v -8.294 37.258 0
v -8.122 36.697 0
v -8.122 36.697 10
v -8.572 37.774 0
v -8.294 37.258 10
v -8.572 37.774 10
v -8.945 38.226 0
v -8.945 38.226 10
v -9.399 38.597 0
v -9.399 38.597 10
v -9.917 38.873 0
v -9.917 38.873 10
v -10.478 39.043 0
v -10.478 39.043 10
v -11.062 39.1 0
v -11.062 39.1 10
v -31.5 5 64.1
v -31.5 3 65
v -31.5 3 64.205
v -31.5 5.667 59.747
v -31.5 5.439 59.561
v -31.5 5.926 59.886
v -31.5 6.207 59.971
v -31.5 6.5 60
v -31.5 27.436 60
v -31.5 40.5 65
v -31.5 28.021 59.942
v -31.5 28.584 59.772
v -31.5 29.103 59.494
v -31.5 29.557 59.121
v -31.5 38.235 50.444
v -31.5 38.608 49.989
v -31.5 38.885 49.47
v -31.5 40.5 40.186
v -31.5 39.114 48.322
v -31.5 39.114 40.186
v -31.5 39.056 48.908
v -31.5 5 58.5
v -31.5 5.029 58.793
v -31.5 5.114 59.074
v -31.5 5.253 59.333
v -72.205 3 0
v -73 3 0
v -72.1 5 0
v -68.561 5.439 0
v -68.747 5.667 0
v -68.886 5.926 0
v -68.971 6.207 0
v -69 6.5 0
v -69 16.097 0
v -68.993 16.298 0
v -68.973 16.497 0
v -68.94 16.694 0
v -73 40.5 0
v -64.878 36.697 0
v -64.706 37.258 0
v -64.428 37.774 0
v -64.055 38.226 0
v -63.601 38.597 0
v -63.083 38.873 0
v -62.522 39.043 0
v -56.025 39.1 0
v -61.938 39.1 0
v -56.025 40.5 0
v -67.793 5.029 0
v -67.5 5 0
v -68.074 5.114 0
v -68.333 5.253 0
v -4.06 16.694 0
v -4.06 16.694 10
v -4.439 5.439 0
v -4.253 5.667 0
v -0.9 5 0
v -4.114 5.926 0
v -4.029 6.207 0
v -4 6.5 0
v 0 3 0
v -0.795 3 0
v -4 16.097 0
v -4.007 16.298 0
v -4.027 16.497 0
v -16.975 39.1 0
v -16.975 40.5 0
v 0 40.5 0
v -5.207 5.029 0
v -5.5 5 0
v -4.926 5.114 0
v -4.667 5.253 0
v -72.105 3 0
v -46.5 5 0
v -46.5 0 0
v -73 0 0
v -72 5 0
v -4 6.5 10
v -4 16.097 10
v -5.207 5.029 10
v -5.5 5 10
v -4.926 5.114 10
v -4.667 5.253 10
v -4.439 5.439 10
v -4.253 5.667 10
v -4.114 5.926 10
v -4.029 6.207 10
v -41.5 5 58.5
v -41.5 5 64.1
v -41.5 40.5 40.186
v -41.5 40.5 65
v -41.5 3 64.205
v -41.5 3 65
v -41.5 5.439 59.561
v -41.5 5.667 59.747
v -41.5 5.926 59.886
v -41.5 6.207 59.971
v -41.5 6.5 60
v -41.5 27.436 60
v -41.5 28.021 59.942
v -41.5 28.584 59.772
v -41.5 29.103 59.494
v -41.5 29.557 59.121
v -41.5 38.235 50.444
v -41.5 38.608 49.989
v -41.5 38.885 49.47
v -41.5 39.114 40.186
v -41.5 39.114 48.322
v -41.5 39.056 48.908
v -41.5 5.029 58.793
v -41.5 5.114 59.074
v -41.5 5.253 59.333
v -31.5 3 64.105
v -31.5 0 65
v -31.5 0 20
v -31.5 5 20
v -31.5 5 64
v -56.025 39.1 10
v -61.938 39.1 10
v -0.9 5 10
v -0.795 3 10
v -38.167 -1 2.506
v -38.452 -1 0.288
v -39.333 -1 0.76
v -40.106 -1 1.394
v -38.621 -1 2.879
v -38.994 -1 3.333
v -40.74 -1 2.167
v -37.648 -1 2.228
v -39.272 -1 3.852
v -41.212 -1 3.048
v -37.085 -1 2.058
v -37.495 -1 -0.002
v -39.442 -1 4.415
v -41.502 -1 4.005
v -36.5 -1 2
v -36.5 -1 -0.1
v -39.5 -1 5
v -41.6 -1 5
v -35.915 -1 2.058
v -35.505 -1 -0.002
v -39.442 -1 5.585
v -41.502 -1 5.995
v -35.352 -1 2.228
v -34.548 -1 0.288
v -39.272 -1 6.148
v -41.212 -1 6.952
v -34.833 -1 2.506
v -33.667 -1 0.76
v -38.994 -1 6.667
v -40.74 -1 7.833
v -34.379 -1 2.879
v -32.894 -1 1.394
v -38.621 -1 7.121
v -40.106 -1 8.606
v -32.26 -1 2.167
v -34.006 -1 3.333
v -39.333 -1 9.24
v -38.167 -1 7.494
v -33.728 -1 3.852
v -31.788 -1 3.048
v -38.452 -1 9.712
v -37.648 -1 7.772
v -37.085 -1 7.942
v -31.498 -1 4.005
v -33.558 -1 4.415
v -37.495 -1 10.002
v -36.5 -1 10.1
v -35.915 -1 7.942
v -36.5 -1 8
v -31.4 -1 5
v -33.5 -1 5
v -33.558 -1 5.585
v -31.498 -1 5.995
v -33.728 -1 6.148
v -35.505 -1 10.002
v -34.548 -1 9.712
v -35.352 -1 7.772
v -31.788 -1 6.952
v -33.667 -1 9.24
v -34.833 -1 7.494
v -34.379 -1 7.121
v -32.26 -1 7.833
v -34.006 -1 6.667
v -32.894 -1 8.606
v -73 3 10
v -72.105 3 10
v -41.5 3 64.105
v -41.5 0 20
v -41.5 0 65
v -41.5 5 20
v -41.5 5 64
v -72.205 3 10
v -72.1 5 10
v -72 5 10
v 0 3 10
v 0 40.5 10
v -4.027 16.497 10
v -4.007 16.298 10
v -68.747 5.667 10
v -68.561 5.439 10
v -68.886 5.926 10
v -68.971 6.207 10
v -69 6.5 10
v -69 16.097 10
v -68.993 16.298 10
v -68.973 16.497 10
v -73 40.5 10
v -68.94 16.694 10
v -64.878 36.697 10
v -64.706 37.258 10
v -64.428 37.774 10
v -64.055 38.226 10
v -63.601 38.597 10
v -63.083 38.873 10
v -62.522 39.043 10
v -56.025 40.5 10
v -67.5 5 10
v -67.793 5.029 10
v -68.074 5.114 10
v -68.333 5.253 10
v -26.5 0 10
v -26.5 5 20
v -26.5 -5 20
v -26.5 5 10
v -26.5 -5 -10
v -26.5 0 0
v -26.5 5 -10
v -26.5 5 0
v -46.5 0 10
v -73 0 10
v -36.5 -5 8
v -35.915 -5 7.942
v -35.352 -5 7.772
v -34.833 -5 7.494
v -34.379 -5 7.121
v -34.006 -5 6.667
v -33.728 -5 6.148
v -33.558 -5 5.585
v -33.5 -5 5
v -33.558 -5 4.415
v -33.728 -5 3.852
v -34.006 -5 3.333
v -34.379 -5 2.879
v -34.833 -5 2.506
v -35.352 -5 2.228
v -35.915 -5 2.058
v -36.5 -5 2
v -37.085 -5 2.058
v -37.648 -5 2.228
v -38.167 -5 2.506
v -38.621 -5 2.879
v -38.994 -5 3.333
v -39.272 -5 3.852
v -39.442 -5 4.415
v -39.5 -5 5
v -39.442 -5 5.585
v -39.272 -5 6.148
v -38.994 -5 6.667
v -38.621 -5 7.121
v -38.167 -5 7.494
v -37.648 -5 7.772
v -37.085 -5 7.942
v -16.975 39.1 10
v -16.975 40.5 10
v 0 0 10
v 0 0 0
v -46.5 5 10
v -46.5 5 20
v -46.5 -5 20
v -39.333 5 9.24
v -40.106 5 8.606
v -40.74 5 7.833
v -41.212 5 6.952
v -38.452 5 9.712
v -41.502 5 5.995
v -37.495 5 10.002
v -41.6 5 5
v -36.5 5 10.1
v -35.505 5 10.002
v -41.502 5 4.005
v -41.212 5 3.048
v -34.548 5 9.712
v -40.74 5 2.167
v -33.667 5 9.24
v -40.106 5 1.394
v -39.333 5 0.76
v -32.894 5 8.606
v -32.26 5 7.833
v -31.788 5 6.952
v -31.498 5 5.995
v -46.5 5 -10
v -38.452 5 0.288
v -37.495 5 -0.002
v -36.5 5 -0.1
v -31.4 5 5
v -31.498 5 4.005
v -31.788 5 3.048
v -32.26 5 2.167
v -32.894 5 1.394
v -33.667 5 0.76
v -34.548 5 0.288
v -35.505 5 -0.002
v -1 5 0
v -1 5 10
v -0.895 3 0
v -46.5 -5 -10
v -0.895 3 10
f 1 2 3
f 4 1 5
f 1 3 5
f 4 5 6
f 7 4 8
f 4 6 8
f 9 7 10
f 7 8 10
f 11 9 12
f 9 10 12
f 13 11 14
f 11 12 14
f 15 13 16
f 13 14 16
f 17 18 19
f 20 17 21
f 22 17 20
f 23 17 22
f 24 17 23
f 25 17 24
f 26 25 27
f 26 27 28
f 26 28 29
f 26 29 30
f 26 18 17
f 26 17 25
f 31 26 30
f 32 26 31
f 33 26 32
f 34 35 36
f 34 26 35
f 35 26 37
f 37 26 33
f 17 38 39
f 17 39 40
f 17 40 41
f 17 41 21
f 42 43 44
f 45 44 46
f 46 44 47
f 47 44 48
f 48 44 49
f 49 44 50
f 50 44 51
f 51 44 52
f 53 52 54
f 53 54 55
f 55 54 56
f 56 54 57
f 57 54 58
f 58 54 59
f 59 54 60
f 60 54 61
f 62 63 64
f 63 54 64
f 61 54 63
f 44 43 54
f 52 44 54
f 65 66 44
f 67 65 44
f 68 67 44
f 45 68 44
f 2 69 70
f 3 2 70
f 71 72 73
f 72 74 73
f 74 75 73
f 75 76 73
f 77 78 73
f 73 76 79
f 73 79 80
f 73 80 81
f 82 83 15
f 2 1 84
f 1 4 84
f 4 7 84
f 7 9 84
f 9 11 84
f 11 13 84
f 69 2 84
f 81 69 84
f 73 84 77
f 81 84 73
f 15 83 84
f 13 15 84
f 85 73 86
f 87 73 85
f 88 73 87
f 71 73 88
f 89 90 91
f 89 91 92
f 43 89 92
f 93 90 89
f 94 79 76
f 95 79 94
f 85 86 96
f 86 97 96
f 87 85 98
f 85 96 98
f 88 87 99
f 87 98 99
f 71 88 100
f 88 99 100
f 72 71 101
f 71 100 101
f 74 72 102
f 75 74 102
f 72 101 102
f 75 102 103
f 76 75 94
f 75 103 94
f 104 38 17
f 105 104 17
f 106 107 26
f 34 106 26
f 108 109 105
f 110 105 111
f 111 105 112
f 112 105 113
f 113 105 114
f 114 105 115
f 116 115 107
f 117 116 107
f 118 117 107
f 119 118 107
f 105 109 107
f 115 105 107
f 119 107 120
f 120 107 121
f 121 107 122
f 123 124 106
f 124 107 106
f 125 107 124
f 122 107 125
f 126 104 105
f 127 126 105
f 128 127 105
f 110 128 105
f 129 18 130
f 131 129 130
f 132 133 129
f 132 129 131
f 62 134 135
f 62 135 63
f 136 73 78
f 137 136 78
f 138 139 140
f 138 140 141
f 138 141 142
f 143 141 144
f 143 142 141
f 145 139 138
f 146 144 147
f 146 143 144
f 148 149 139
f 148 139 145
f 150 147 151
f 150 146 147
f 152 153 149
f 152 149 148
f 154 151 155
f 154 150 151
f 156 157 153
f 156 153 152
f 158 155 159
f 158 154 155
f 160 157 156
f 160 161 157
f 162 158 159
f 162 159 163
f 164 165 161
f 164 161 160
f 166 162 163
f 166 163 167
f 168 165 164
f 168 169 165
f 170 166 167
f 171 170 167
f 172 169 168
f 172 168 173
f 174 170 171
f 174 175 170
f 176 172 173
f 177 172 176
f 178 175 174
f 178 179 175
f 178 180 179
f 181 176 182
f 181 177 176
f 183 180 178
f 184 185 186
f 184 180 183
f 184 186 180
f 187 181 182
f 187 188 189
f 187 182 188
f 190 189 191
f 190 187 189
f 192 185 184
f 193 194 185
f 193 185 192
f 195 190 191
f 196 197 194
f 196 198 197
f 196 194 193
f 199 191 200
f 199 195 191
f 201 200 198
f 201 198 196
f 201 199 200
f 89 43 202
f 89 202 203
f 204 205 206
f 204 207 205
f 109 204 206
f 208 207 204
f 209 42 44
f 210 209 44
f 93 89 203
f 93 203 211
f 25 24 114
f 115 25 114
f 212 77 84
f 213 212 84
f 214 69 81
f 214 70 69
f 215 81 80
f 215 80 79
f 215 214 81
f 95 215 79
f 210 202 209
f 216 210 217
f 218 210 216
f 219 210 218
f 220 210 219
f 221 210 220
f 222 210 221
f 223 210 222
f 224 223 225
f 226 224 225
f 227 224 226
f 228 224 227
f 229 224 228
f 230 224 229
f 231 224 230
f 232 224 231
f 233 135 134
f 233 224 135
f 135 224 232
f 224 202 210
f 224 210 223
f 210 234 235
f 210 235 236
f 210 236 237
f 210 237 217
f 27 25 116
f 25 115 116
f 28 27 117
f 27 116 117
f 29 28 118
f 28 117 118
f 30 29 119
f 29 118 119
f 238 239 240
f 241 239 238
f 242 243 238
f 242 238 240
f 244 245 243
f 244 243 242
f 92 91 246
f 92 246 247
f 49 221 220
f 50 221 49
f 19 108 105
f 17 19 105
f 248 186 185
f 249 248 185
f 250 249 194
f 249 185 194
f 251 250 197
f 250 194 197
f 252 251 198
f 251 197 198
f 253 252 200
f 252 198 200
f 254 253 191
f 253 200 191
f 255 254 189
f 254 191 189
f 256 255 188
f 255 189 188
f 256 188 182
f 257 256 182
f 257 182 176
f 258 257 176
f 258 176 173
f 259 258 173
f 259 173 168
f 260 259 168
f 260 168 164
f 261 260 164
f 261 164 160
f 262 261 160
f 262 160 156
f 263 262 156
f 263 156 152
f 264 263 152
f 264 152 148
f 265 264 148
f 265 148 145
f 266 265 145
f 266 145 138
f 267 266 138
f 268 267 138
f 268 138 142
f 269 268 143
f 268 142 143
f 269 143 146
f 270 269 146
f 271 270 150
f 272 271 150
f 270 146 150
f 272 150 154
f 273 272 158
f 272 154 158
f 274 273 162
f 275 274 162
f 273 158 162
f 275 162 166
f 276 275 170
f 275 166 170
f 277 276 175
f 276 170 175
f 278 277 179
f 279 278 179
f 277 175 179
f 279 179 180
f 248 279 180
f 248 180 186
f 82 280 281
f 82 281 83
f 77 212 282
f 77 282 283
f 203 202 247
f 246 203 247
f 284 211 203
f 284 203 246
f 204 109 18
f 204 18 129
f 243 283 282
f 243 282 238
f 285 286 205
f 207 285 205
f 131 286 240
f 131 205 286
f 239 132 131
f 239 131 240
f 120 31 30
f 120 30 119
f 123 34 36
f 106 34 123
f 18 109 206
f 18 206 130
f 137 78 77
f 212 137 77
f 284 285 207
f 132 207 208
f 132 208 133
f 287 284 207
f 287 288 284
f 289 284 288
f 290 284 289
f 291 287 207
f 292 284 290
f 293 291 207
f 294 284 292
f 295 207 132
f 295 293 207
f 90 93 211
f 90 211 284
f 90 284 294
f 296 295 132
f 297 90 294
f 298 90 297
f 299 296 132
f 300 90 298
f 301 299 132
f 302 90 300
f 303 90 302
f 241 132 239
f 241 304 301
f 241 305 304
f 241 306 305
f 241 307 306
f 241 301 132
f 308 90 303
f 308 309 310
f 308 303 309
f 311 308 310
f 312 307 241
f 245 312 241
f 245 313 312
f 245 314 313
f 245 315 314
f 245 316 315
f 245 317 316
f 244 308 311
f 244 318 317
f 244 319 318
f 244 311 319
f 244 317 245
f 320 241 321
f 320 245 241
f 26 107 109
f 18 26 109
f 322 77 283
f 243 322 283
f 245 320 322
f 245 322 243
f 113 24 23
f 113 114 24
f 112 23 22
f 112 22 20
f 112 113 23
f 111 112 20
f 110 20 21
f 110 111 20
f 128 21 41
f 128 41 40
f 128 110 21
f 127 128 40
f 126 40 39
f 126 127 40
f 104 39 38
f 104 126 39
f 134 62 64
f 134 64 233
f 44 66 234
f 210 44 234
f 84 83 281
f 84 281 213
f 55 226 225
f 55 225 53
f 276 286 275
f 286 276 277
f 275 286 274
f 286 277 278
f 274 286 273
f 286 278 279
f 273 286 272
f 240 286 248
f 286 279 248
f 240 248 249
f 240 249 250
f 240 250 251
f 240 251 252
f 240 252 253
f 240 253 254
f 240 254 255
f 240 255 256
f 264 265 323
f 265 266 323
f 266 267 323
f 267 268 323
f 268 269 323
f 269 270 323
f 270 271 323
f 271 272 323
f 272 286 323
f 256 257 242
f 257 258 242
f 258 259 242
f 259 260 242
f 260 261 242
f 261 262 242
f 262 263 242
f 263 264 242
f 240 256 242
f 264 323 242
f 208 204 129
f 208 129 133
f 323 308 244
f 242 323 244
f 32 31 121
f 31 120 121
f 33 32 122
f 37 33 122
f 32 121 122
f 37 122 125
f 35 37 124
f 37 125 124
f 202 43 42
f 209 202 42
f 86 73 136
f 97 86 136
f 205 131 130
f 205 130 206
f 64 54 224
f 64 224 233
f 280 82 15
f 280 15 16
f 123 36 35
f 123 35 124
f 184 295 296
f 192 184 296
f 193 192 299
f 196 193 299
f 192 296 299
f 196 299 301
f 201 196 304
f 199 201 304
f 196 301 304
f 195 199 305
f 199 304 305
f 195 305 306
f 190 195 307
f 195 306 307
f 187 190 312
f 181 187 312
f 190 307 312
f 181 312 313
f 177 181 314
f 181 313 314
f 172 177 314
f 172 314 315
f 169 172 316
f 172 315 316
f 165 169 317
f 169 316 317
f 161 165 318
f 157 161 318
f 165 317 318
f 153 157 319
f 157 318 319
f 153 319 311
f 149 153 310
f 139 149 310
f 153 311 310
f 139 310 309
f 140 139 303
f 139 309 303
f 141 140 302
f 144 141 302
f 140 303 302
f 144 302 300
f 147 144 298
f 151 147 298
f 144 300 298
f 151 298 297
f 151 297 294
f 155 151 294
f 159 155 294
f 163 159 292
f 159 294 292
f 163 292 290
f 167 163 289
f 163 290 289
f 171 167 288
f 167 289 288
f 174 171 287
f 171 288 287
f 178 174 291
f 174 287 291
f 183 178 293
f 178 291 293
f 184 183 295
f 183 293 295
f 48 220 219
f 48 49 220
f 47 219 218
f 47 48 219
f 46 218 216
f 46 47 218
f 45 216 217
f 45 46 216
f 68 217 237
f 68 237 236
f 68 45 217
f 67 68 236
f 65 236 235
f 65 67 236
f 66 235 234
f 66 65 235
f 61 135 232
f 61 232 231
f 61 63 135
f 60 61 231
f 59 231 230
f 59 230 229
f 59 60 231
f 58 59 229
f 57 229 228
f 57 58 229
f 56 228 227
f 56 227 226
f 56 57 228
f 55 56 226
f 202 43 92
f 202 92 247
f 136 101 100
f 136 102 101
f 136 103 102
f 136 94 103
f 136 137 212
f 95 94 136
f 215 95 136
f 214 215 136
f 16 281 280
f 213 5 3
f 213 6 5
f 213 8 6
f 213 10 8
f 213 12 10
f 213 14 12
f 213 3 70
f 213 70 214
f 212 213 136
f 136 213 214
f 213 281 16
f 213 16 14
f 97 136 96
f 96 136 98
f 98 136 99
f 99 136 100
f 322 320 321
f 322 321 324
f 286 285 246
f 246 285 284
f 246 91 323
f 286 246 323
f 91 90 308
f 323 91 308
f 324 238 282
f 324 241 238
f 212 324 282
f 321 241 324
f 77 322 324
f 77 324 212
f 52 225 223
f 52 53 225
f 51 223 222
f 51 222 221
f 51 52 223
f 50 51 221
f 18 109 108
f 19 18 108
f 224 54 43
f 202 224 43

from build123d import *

# Parameters (mm, degrees)
BOSS_EXTRUDE1_DEPTH      = 5
SKETCH2_W                = 10
SKETCH2_H                = 5
SKETCH5_W                = 4
SKETCH5_H                = 10
SKETCH15_W               = 4
SKETCH15_H               = 10
FILLET1_R                = 3
FILLET2_R                = 3
FILLET3_R                = 1.5
FILLET4_R                = 3
FILLET5_R                = 1.5
LIP_GROOVE1_GROOVE_START = -41.5
LIP_GROOVE1_GROOVE_DEPTH = 10
LIP_GROOVE1_LIP_START    = -41.5
LIP_GROOVE1_LIP_DEPTH    = 10
LIP_GROOVE2_GROOVE_DEPTH = 10
LIP_GROOVE2_LIP_DEPTH    = 10
LIP_GROOVE3_GROOVE_DEPTH = 10
LIP_GROOVE3_LIP_DEPTH    = 10
BOSS_EXTRUDE2_DEPTH      = 10
BOSS_EXTRUDE3_DEPTH      = 10
CUT_EXTRUDE1_START       = -10
CUT_EXTRUDE1_OUTLINE_W   = 16.974937186
CUT_EXTRUDE1_OUTLINE_H   = 2.6
CUT_EXTRUDE1_OUTLINE_W_2 = 10
CUT_EXTRUDE1_OUTLINE_H_2 = 3.613708499
CUT_EXTRUDE1_DEPTH       = 65
SKETCH25_W               = 20
SKETCH25_H               = 30
BOSS_EXTRUDE4_DEPTH      = 10
SKETCH40_R               = 5.1
CUT_EXTRUDE4_DEPTH       = 6
SKETCH43_R               = 3
CUT_EXTRUDE5_DEPTH       = 104.991586198


# Read off the part's stored shape, not the designer's step: Lip&Groove1-Groove, Lip&Groove1-Lip, Lip&Groove2-Groove, Lip&Groove2-Lip, Lip&Groove3-Groove, Lip&Groove3-Lip, Cut-Extrude1
with BuildPart() as part:
    # Sketch1 → Boss-Extrude1 (new body)
    with BuildSketch(Plane(origin=(0, 0, 0), x_dir=(1, 0, 0), z_dir=(0, 1, 0))):
        Polygon((-41.5, -10), (-73, -10), (-73, 0), (0, 0), (0, -10), (-31.5, -10), (-31.5, -65), (-41.5, -65), align=None)
    extrude(amount=BOSS_EXTRUDE1_DEPTH)

    # Sweep1: sweep along a path in Sketch4
    with BuildLine(Plane.ZY.offset(36.5)) as sweep1_path:
        Line((61.5, 5), (61.5, 29.3))
        Line((61.5, 29.3), (50.186291501, 40.613708499))
        Line((50.186291501, 40.613708499), (40.186291501, 40.613708499))
    # Sketch2 → Sweep1 (sweep)
    with BuildSketch(Plane(origin=(0, 5, 0), x_dir=(1, 0, 0), z_dir=(0, 1, 0))):
        with Locations((-36.5, -62.5)):
            Rectangle(SKETCH2_W, SKETCH2_H)
    sweep(path=sweep1_path.line, transition=Transition.RIGHT)

    # Sweep6: sweep along a path in Sketch11
    with BuildLine(Plane(origin=(0, 0, 5), x_dir=(-1, 0, 0), z_dir=(0, 0, -1))) as sweep6_path:
        Line((71, 5), (71, 16.6))
        Line((71, 16.6), (66.025062814, 41.1))
        Line((66.025062814, 41.1), (56.025062814, 41.1))
    # Sketch5 → Sweep6 (sweep)
    with BuildSketch(Plane(origin=(0, 5, 0), x_dir=(1, 0, 0), z_dir=(0, 1, 0))):
        with Locations((-71, -5)):
            Rectangle(SKETCH5_W, SKETCH5_H)
    sweep(path=sweep6_path.line, transition=Transition.RIGHT)

    # Sweep7: sweep along a path in Sketch16
    with BuildLine(Plane(origin=(0, 0, 5), x_dir=(-1, 0, 0), z_dir=(0, 0, -1))) as sweep7_path:
        Line((2, 5), (2, 16.6))
        Line((2, 16.6), (6.974937186, 41.1))
        Line((6.974937186, 41.1), (16.974937186, 41.1))
    # Sketch15 → Sweep7 (sweep)
    with BuildSketch(Plane(origin=(0, 5, 0), x_dir=(1, 0, 0), z_dir=(0, 1, 0))):
        with Locations((-2, -5)):
            Rectangle(SKETCH15_W, SKETCH15_H)
    sweep(path=sweep7_path.line, transition=Transition.RIGHT)

    # Fillet1
    fillet1_edges = [part.edges().sort_by_distance(p)[0] for p in [
        (-64.390363809, 39.1, 5),
        (-8.609636191, 39.1, 5),
    ]]
    fillet(fillet1_edges, radius=FILLET1_R)

    # Fillet2
    fillet2_edges = [part.edges().sort_by_distance(p)[0] for p in [
        (-69, 16.398992437, 5),
        (-4, 16.398992437, 5),
    ]]
    fillet(fillet2_edges, radius=FILLET2_R)

    # Fillet3
    fillet3_edges = [part.edges().sort_by_distance(p)[0] for p in [
        (-69, 5, 5),
        (-4, 5, 5),
    ]]
    fillet(fillet3_edges, radius=FILLET3_R)

    # Fillet4
    fillet4_edges = [part.edges().sort_by_distance(p)[0] for p in [
        (-36.5, 39.113708499, 49.564971157),
        (-36.5, 28.678679656, 60),
    ]]
    fillet(fillet4_edges, radius=FILLET4_R)

    # Fillet5
    fillet5_edges = [part.edges().sort_by_distance(p)[0] for p in [
        (-36.5, 5, 60),
    ]]
    fillet(fillet5_edges, radius=FILLET5_R)


with BuildPart() as body_2:
    # Split1: the piece on the far side of the plane
    add(part.part)
    split(bisect_by=Plane.ZX.offset(5), keep=Keep.BOTTOM)

    # Lip&Groove1-Groove outline → Lip&Groove1-Groove (cut)
    with BuildSketch(Plane.YZ.offset(LIP_GROOVE1_GROOVE_START)):
        Polygon((3, 65), (3, 64.104815559), (5, 64), (5, 65), align=None)
    extrude(amount=LIP_GROOVE1_GROOVE_DEPTH, mode=Mode.SUBTRACT)

    # Lip&Groove2-Groove outline → Lip&Groove2-Groove (cut)
    with BuildSketch(Plane.XY):
        Polygon((-73, 3), (-72.104815559, 3), (-72, 5), (-73, 5), align=None)
    extrude(amount=LIP_GROOVE2_GROOVE_DEPTH, mode=Mode.SUBTRACT)

    # Lip&Groove3-Groove outline → Lip&Groove3-Groove (cut)
    with BuildSketch(Plane.XY):
        Polygon((-0.895184441, 3), (0, 3), (0, 5), (-1, 5), align=None)
    extrude(amount=LIP_GROOVE3_GROOVE_DEPTH, mode=Mode.SUBTRACT)

    # Sketch25 → Boss-Extrude4 (add)
    with BuildSketch(Plane(origin=(0, 5, 0), x_dir=(1, 0, 0), z_dir=(0, 1, 0))):
        with Locations((-36.5, -5)):
            Rectangle(SKETCH25_W, SKETCH25_H)
    extrude(amount=-BOSS_EXTRUDE4_DEPTH)

    # Sketch40 → Cut-Extrude4 (cut)
    with BuildSketch(Plane(origin=(0, 5, 0), x_dir=(1, 0, 0), z_dir=(0, 1, 0))):
        with Locations(Location((-36.5, -5, 0), (0, 0, 270))):
            Circle(SKETCH40_R)
    extrude(amount=-CUT_EXTRUDE4_DEPTH, mode=Mode.SUBTRACT)

    # Sketch43 → Cut-Extrude5 (cut, through all)
    with BuildSketch(Plane(origin=(0, 5, 0), x_dir=(1, 0, 0), z_dir=(0, 1, 0))):
        with Locations(Location((-36.5, -5, 0), (0, 0, 270))):
            Circle(SKETCH43_R)
    extrude(amount=-CUT_EXTRUDE5_DEPTH, mode=Mode.SUBTRACT)


with BuildPart() as part_1:
    add(part.part)

    # Split1
    split(bisect_by=Plane.ZX.offset(5), keep=Keep.TOP)

    # Lip&Groove1-Lip outline → Lip&Groove1-Lip (add)
    with BuildSketch(Plane.YZ.offset(LIP_GROOVE1_LIP_START)):
        Polygon((3, 65), (3, 64.204815559), (5, 64.1), (5, 65), align=None)
    extrude(amount=LIP_GROOVE1_LIP_DEPTH)

    # Lip&Groove2-Lip outline → Lip&Groove2-Lip (add)
    with BuildSketch(Plane.XY):
        Polygon((-73, 5), (-73, 3), (-72.204815559, 3), (-72.1, 5), align=None)
    extrude(amount=LIP_GROOVE2_LIP_DEPTH)

    # Lip&Groove3-Lip outline → Lip&Groove3-Lip (add)
    with BuildSketch(Plane.XY):
        Polygon((-0.795184441, 3), (0, 3), (0, 5), (-0.9, 5), align=None)
    extrude(amount=LIP_GROOVE3_LIP_DEPTH)

    # Sketch18 → Boss-Extrude2 (add)
    with BuildSketch(Plane(origin=(0, 0, 0), x_dir=(-1, 0, 0), z_dir=(0, 0, -1))):
        Polygon((0, 16.801007563), (0, 43.1), (5.34023818, 43.1), align=None)
        Polygon((67.65976182, 43.1), (73, 43.1), (73, 16.801007563), align=None)
    extrude(amount=-BOSS_EXTRUDE2_DEPTH)

    # Sketch19 → Boss-Extrude3 (add)
    with BuildSketch(Plane.ZY.offset(41.5)):
        Polygon((51.636038969, 44.113708499), (65, 44.113708499), (65, 30.749747468), align=None)
    extrude(amount=-BOSS_EXTRUDE3_DEPTH)

    # Cut-Extrude1 outline → Cut-Extrude1 (cut)
    with BuildSketch(Plane.XY.offset(10).offset(CUT_EXTRUDE1_START)):
        with Locations((-64.512531407, 41.8)):
            Rectangle(CUT_EXTRUDE1_OUTLINE_W, CUT_EXTRUDE1_OUTLINE_H)
        with Locations((-8.487468593, 41.8)):
            Rectangle(CUT_EXTRUDE1_OUTLINE_W, CUT_EXTRUDE1_OUTLINE_H)
        with Locations((-36.5, 42.30685425)):
            Rectangle(CUT_EXTRUDE1_OUTLINE_W_2, CUT_EXTRUDE1_OUTLINE_H_2)
    extrude(amount=CUT_EXTRUDE1_DEPTH, mode=Mode.SUBTRACT)


solid = Compound([body_2.part, part_1.part])
